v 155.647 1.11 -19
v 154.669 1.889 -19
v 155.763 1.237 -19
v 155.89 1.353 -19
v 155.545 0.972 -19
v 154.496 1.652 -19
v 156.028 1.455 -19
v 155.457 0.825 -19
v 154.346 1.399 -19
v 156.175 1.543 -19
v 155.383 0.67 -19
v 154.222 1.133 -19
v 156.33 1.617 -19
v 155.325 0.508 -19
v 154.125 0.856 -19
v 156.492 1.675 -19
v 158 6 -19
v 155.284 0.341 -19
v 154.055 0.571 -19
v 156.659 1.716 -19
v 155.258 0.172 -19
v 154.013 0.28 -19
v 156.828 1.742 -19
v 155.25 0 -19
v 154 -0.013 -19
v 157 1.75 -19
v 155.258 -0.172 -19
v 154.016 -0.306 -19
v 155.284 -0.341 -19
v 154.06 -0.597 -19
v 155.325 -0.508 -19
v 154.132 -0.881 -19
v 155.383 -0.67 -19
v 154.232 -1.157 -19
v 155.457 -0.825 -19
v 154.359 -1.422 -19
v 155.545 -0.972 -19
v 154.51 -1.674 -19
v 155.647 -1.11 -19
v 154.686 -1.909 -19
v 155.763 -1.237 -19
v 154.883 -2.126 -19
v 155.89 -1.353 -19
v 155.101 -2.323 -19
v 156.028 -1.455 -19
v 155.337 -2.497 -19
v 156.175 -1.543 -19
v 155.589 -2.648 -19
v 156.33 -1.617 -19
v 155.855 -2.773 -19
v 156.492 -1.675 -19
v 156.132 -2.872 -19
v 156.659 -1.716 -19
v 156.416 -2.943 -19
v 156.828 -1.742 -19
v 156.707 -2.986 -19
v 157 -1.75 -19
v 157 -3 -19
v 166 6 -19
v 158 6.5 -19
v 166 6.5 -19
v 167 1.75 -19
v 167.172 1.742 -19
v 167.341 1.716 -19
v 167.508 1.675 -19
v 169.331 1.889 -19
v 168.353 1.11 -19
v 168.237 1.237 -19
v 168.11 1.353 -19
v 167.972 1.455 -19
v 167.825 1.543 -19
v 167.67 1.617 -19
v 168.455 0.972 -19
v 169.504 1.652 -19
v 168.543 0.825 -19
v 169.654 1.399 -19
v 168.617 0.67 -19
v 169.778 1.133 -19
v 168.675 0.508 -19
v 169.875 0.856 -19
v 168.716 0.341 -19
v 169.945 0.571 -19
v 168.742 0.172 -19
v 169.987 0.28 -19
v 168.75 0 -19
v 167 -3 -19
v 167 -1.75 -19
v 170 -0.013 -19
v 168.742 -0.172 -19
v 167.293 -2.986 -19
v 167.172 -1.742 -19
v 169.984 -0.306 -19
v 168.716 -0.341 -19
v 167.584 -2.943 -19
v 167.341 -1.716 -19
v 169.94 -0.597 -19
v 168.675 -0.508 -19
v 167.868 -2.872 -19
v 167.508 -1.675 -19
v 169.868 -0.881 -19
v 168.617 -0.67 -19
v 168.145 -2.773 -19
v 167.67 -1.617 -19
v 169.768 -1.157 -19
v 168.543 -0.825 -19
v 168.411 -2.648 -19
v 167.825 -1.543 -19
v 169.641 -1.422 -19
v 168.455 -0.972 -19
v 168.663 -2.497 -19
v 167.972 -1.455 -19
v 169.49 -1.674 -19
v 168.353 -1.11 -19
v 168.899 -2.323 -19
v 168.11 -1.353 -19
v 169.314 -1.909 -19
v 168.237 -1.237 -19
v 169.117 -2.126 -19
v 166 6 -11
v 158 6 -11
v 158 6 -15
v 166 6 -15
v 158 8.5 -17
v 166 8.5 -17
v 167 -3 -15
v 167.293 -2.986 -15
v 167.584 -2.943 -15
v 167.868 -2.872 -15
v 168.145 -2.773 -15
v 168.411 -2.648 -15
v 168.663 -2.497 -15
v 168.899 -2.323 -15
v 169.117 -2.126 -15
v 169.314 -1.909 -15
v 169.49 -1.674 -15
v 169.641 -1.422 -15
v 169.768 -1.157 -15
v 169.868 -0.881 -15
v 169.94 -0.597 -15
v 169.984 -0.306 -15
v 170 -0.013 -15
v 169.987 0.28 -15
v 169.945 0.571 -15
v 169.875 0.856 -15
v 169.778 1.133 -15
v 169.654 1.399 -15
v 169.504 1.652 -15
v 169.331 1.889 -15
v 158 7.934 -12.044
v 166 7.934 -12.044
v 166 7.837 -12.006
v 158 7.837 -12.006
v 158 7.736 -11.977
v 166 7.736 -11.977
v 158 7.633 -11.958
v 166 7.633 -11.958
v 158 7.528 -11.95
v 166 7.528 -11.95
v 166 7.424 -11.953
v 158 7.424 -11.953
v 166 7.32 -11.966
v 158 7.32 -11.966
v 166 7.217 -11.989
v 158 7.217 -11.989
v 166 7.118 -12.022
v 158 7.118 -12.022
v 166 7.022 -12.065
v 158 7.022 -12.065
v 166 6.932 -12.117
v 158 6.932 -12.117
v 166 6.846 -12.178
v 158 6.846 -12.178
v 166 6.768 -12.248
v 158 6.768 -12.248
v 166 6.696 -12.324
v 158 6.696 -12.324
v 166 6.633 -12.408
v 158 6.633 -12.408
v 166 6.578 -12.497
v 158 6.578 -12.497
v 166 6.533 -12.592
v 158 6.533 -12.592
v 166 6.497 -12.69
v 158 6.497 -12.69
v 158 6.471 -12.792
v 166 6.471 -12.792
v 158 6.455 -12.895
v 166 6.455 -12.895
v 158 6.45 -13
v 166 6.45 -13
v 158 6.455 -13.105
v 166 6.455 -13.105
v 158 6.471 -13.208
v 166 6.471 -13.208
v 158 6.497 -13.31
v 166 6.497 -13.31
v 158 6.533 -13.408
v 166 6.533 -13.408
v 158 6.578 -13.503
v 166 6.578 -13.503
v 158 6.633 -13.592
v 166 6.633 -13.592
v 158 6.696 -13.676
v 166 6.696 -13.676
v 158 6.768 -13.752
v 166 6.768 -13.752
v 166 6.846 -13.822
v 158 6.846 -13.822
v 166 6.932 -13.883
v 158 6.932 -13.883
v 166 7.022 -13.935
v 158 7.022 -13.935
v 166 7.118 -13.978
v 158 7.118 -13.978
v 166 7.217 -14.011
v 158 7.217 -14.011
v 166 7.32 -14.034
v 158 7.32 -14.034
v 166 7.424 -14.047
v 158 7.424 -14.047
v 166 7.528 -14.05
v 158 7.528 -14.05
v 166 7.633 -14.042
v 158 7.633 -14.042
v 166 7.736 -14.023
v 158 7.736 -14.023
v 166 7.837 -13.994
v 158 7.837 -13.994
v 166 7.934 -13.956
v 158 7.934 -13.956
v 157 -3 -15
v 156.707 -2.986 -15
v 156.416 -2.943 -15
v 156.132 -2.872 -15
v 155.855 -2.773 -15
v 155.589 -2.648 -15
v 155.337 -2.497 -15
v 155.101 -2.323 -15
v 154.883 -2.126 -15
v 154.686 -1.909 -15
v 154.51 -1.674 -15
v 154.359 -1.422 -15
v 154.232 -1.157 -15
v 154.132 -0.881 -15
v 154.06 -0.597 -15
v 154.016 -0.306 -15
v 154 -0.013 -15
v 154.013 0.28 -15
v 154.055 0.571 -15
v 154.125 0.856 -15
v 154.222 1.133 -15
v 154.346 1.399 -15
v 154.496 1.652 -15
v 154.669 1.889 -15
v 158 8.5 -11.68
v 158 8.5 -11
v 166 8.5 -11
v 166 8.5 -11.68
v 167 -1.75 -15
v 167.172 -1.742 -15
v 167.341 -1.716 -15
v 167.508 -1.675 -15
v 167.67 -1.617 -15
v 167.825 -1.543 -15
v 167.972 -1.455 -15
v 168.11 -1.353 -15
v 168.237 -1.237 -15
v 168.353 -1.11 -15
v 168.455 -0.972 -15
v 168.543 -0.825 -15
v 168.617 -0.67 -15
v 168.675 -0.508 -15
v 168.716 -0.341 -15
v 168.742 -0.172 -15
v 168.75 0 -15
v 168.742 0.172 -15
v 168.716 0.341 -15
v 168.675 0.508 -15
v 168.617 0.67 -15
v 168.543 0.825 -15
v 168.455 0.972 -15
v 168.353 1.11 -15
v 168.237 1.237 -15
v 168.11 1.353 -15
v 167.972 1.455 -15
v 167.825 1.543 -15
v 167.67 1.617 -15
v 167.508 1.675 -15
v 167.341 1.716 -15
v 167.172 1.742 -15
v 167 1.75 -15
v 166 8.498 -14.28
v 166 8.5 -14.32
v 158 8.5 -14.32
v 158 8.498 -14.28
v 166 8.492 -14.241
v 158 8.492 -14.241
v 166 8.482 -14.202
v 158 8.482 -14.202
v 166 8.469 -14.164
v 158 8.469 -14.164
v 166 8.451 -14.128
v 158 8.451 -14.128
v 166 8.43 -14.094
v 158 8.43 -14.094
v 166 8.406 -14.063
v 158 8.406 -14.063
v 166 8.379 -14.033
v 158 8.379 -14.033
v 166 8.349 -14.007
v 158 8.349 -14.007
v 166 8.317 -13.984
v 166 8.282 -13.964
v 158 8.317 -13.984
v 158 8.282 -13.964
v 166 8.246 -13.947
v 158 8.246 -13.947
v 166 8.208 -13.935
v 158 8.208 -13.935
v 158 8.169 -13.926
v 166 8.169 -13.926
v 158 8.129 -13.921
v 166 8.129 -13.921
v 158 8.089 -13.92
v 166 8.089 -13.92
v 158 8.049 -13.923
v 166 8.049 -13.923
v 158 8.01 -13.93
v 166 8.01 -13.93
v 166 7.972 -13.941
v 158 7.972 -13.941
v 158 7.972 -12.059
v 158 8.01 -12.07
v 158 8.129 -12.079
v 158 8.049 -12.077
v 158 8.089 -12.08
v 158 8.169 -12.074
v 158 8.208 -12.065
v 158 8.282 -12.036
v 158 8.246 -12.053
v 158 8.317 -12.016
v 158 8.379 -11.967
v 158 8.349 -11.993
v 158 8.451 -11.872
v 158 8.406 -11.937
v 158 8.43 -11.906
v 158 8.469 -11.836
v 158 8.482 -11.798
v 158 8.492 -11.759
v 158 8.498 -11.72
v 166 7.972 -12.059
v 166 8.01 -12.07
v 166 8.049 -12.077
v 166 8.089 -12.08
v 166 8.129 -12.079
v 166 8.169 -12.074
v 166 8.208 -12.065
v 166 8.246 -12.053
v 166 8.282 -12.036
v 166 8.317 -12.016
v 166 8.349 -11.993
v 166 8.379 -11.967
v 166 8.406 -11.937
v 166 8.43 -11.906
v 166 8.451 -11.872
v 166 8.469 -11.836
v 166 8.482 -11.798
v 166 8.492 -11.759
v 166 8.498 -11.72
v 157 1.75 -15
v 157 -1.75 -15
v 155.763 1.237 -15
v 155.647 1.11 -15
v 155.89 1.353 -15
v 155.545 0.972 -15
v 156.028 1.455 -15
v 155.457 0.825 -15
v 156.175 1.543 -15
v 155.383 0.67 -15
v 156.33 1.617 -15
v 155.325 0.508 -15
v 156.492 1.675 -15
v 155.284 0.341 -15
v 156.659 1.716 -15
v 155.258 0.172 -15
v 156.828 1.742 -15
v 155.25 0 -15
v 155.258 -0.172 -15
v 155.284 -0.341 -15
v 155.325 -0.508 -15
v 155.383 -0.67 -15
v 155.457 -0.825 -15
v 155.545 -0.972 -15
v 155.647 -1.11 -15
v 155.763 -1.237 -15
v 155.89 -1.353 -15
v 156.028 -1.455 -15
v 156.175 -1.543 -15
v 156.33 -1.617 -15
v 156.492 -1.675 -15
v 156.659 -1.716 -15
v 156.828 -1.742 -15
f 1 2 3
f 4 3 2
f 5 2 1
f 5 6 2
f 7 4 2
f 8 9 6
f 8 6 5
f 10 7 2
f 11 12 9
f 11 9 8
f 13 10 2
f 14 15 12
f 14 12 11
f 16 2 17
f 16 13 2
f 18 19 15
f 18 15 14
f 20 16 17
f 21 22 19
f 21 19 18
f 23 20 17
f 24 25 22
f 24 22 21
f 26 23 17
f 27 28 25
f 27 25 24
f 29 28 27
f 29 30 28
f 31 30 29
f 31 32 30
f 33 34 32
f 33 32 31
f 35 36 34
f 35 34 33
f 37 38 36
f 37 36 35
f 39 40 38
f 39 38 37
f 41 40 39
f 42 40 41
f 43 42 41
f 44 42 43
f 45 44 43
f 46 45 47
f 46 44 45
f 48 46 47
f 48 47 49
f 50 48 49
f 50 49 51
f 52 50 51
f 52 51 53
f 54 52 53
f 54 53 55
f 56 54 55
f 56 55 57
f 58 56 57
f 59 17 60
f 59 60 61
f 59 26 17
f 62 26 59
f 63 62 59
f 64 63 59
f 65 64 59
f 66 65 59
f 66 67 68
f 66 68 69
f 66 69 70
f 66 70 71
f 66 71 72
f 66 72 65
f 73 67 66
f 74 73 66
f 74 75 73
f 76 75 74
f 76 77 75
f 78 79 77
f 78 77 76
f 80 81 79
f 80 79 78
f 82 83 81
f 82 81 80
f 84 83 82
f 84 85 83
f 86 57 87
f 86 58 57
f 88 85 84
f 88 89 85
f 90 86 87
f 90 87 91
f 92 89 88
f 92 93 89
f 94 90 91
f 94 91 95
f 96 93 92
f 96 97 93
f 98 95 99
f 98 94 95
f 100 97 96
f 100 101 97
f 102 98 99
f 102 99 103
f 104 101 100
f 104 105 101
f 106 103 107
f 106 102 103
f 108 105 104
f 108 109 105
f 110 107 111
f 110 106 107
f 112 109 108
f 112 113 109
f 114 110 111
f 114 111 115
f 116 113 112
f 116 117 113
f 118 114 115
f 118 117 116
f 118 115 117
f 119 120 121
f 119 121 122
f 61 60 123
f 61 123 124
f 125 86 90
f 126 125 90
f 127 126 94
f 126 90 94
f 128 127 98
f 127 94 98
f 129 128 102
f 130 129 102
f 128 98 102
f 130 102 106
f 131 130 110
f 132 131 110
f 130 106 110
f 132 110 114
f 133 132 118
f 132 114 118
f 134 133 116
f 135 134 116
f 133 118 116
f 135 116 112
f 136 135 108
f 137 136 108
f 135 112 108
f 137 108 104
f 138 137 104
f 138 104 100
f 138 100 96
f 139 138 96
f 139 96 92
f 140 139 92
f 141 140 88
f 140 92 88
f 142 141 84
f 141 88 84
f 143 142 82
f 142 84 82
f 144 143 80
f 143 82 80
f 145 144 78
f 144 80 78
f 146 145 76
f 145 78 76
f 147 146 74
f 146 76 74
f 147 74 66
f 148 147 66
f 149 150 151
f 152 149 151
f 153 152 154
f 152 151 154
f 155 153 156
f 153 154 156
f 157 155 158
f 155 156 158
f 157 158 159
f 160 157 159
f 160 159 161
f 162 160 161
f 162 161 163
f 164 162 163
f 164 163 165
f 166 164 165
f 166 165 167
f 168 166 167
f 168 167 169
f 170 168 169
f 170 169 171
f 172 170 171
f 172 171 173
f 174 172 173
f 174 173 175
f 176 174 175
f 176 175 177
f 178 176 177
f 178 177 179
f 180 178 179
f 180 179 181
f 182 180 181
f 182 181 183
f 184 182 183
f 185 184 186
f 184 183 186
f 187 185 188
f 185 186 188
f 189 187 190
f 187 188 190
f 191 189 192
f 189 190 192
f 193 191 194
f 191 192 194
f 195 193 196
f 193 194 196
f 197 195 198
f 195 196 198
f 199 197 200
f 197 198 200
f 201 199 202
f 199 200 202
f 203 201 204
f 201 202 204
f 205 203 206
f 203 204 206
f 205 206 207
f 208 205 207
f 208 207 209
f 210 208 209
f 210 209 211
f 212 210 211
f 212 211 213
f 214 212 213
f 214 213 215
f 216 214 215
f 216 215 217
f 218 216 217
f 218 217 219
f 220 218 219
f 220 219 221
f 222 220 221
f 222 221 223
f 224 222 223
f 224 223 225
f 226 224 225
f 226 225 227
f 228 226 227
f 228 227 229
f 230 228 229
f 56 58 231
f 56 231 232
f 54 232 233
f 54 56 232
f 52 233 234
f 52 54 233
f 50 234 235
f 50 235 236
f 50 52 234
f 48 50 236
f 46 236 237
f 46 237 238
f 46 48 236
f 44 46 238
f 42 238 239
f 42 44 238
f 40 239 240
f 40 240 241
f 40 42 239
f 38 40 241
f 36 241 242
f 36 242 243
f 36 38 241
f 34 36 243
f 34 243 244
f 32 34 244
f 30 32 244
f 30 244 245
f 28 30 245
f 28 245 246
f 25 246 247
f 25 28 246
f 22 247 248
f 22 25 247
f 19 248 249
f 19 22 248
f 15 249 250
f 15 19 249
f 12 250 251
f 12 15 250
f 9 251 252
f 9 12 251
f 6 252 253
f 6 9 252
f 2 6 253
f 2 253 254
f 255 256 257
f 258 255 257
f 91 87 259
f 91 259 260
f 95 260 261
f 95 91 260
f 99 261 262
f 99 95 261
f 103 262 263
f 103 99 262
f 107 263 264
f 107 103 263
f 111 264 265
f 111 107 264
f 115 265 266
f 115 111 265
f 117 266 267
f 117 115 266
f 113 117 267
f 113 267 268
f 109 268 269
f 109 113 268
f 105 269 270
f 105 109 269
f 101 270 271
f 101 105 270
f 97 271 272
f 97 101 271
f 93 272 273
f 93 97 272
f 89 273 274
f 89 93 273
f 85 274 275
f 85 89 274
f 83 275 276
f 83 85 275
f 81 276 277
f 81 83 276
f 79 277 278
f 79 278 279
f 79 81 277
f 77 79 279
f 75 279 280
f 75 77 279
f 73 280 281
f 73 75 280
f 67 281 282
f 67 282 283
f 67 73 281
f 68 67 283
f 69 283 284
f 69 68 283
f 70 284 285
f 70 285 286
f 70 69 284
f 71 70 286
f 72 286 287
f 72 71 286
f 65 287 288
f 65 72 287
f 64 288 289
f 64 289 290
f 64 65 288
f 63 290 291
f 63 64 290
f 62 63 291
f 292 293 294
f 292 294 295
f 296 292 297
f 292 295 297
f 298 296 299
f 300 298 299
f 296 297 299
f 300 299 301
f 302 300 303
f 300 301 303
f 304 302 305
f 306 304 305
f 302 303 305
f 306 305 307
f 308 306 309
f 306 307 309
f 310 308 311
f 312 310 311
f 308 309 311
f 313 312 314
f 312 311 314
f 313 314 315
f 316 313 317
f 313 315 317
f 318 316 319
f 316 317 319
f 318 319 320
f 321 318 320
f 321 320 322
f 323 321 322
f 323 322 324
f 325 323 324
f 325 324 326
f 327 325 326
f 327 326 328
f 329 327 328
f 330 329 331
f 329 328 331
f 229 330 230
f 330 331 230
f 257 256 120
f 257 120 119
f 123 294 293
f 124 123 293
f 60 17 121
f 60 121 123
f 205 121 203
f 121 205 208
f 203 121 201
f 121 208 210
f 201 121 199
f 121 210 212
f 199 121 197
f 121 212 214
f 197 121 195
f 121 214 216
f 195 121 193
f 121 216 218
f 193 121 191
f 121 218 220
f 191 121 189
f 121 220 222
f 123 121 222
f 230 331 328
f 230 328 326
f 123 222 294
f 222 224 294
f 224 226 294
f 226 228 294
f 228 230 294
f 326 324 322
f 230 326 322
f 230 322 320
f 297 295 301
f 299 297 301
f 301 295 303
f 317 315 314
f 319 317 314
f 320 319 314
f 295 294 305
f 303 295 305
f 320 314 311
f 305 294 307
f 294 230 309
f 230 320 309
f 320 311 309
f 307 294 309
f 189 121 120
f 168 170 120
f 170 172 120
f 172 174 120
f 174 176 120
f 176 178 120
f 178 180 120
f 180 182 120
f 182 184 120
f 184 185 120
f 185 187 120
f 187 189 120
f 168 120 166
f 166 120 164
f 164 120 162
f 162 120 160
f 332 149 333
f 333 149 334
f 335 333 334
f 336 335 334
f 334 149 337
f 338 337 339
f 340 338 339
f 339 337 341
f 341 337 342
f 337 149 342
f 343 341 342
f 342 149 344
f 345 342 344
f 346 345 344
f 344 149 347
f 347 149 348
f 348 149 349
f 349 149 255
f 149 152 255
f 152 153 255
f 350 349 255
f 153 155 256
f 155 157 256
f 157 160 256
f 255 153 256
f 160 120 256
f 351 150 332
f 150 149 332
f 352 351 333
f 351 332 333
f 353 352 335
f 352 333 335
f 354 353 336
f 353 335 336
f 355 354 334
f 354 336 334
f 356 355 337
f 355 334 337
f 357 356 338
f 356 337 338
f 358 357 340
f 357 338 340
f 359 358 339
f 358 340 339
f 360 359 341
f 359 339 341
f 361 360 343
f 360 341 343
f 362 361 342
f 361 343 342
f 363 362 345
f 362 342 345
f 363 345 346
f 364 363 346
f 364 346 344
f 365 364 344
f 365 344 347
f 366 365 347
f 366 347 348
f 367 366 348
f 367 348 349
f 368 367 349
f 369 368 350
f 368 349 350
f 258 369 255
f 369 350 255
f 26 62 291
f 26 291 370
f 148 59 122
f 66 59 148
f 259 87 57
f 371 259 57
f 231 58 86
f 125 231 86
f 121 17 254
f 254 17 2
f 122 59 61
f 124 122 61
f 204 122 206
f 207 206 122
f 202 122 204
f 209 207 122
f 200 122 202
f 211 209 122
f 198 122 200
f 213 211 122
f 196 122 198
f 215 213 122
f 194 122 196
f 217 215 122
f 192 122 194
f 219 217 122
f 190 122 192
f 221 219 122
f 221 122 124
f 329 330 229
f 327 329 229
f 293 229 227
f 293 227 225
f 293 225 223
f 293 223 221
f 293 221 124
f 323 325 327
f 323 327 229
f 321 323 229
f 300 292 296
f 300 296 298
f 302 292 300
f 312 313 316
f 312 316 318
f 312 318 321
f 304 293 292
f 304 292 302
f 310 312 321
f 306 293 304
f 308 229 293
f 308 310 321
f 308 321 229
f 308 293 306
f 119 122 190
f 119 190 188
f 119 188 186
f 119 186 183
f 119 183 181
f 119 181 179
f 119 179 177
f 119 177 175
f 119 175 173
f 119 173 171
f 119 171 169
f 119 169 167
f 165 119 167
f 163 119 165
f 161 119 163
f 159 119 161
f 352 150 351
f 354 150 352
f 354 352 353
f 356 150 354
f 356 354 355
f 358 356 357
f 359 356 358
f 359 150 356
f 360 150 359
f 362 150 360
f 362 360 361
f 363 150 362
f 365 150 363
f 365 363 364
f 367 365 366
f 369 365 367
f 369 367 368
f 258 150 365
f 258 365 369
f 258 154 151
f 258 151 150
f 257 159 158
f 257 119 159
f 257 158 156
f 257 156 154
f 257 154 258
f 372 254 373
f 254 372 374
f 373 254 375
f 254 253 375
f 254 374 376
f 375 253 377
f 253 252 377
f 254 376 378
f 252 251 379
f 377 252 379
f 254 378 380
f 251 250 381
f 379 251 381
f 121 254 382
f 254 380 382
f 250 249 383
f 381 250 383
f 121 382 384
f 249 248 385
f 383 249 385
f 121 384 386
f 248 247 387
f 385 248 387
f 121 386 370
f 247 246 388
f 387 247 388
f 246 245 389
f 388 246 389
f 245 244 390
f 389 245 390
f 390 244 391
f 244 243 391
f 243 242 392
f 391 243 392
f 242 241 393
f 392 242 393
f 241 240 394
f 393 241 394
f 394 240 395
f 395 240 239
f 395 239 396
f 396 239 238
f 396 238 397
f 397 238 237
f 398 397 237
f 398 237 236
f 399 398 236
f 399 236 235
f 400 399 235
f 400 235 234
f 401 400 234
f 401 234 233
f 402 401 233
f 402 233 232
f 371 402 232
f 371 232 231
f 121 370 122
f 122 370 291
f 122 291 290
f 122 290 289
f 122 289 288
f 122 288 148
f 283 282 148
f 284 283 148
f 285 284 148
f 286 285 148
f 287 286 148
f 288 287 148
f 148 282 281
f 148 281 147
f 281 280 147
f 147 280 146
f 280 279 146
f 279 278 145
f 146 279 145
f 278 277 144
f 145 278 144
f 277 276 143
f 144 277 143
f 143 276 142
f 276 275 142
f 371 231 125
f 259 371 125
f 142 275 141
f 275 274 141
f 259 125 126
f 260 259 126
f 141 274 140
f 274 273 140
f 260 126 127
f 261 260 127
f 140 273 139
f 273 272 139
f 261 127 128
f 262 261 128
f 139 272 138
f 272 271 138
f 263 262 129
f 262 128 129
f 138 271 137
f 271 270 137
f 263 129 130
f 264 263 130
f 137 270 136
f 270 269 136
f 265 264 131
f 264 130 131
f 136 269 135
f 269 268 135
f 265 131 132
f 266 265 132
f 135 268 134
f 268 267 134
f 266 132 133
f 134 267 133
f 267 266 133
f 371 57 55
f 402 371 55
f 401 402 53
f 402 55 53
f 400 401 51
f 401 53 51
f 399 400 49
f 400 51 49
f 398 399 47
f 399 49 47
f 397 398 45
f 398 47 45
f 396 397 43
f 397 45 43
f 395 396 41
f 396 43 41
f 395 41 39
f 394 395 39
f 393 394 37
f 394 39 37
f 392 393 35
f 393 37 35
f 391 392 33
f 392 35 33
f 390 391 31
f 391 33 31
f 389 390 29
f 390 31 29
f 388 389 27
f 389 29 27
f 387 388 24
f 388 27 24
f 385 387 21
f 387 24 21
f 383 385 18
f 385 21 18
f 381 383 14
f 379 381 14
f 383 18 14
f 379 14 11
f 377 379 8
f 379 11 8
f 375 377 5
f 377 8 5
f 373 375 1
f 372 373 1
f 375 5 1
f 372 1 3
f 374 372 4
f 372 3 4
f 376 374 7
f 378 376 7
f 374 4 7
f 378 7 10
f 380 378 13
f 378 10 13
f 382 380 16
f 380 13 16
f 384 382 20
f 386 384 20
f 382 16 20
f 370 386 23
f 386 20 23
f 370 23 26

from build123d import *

# Parameters (mm, degrees)
SKETCH228_W          = 8
SKETCH228_H          = 2.5
PAD110_DEPTH         = 2
PAD110_DEPTH_BACK    = 6
SKETCH227_R          = 1.05
POCKET092_DEPTH      = 4.001
POCKET092_DEPTH_BACK = 4.001
PAD111_DEPTH         = 4
FILLET001_R          = 0.4
CHAMFER006_SIZE      = 2


with BuildPart() as part:
    # Sketch228 → Pad110 (new body, two sides)
    with BuildSketch(Plane.XY) as pad110_sk:
        with Locations((0, -0.25)):
            Rectangle(SKETCH228_W, SKETCH228_H)
    extrude(amount=PAD110_DEPTH)
    extrude(pad110_sk.sketch, amount=-PAD110_DEPTH_BACK)

    # Sketch227 → Pocket092 (cut, two sides)
    with BuildSketch(Plane.YZ) as pocket092_sk:
        Circle(SKETCH227_R)
    extrude(amount=-POCKET092_DEPTH, mode=Mode.SUBTRACT)
    extrude(pocket092_sk.sketch, amount=POCKET092_DEPTH_BACK, mode=Mode.SUBTRACT)

    # Sketch229 (on Face2 of Pocket092) → Pad111 (join)
    with BuildSketch(Plane(origin=(0, 0, -6), x_dir=(1, 0, 0), z_dir=(0, 0, -1))):
        with BuildLine():
            ThreePointArc((-5, 9.25), (-6.75, 7.5), (-5, 5.75))
            Line((-5, 5.75), (0, 5.75))
            Line((0, 5.75), (0, 1.5))
            Line((0, 1.5), (-4, 1.5))
            Line((-4, 1.5), (-7.331001, 5.6115))
            ThreePointArc((-5, 10.5), (-7.707905, 8.79122), (-7.331001, 5.6115))
            Line((0, 10.5), (-5, 10.5))
            Line((0, 10.5), (0, 9.25))
            Line((-5, 9.25), (0, 9.25))
        make_face()
    pad111 = extrude(amount=-PAD111_DEPTH)

    # Mirrored009: Pad111 across Sketch229 V_Axis
    add(pad111.mirror(Plane(origin=(0, 0, -6), x_dir=(0, 0, -1), z_dir=(1, 0, 0))))

    # Fillet001
    fillet001_edges = [part.edges().sort_by_distance(p)[0] for p in [
        (0, 1, 0.320156),
        (0, 1, -0.320156),
    ]]
    fillet(fillet001_edges, radius=FILLET001_R)

    # Chamfer006
    chamfer006_edges = [part.edges().sort_by_distance(p)[0] for p in [
        (0, 1, -6),
    ]]
    chamfer(chamfer006_edges, length=CHAMFER006_SIZE)


with BuildPart() as part_1:
    # Body081 placement: moved
    add(part.part.moved(Location((162, 7.5, -13))))


solid = part_1.part
